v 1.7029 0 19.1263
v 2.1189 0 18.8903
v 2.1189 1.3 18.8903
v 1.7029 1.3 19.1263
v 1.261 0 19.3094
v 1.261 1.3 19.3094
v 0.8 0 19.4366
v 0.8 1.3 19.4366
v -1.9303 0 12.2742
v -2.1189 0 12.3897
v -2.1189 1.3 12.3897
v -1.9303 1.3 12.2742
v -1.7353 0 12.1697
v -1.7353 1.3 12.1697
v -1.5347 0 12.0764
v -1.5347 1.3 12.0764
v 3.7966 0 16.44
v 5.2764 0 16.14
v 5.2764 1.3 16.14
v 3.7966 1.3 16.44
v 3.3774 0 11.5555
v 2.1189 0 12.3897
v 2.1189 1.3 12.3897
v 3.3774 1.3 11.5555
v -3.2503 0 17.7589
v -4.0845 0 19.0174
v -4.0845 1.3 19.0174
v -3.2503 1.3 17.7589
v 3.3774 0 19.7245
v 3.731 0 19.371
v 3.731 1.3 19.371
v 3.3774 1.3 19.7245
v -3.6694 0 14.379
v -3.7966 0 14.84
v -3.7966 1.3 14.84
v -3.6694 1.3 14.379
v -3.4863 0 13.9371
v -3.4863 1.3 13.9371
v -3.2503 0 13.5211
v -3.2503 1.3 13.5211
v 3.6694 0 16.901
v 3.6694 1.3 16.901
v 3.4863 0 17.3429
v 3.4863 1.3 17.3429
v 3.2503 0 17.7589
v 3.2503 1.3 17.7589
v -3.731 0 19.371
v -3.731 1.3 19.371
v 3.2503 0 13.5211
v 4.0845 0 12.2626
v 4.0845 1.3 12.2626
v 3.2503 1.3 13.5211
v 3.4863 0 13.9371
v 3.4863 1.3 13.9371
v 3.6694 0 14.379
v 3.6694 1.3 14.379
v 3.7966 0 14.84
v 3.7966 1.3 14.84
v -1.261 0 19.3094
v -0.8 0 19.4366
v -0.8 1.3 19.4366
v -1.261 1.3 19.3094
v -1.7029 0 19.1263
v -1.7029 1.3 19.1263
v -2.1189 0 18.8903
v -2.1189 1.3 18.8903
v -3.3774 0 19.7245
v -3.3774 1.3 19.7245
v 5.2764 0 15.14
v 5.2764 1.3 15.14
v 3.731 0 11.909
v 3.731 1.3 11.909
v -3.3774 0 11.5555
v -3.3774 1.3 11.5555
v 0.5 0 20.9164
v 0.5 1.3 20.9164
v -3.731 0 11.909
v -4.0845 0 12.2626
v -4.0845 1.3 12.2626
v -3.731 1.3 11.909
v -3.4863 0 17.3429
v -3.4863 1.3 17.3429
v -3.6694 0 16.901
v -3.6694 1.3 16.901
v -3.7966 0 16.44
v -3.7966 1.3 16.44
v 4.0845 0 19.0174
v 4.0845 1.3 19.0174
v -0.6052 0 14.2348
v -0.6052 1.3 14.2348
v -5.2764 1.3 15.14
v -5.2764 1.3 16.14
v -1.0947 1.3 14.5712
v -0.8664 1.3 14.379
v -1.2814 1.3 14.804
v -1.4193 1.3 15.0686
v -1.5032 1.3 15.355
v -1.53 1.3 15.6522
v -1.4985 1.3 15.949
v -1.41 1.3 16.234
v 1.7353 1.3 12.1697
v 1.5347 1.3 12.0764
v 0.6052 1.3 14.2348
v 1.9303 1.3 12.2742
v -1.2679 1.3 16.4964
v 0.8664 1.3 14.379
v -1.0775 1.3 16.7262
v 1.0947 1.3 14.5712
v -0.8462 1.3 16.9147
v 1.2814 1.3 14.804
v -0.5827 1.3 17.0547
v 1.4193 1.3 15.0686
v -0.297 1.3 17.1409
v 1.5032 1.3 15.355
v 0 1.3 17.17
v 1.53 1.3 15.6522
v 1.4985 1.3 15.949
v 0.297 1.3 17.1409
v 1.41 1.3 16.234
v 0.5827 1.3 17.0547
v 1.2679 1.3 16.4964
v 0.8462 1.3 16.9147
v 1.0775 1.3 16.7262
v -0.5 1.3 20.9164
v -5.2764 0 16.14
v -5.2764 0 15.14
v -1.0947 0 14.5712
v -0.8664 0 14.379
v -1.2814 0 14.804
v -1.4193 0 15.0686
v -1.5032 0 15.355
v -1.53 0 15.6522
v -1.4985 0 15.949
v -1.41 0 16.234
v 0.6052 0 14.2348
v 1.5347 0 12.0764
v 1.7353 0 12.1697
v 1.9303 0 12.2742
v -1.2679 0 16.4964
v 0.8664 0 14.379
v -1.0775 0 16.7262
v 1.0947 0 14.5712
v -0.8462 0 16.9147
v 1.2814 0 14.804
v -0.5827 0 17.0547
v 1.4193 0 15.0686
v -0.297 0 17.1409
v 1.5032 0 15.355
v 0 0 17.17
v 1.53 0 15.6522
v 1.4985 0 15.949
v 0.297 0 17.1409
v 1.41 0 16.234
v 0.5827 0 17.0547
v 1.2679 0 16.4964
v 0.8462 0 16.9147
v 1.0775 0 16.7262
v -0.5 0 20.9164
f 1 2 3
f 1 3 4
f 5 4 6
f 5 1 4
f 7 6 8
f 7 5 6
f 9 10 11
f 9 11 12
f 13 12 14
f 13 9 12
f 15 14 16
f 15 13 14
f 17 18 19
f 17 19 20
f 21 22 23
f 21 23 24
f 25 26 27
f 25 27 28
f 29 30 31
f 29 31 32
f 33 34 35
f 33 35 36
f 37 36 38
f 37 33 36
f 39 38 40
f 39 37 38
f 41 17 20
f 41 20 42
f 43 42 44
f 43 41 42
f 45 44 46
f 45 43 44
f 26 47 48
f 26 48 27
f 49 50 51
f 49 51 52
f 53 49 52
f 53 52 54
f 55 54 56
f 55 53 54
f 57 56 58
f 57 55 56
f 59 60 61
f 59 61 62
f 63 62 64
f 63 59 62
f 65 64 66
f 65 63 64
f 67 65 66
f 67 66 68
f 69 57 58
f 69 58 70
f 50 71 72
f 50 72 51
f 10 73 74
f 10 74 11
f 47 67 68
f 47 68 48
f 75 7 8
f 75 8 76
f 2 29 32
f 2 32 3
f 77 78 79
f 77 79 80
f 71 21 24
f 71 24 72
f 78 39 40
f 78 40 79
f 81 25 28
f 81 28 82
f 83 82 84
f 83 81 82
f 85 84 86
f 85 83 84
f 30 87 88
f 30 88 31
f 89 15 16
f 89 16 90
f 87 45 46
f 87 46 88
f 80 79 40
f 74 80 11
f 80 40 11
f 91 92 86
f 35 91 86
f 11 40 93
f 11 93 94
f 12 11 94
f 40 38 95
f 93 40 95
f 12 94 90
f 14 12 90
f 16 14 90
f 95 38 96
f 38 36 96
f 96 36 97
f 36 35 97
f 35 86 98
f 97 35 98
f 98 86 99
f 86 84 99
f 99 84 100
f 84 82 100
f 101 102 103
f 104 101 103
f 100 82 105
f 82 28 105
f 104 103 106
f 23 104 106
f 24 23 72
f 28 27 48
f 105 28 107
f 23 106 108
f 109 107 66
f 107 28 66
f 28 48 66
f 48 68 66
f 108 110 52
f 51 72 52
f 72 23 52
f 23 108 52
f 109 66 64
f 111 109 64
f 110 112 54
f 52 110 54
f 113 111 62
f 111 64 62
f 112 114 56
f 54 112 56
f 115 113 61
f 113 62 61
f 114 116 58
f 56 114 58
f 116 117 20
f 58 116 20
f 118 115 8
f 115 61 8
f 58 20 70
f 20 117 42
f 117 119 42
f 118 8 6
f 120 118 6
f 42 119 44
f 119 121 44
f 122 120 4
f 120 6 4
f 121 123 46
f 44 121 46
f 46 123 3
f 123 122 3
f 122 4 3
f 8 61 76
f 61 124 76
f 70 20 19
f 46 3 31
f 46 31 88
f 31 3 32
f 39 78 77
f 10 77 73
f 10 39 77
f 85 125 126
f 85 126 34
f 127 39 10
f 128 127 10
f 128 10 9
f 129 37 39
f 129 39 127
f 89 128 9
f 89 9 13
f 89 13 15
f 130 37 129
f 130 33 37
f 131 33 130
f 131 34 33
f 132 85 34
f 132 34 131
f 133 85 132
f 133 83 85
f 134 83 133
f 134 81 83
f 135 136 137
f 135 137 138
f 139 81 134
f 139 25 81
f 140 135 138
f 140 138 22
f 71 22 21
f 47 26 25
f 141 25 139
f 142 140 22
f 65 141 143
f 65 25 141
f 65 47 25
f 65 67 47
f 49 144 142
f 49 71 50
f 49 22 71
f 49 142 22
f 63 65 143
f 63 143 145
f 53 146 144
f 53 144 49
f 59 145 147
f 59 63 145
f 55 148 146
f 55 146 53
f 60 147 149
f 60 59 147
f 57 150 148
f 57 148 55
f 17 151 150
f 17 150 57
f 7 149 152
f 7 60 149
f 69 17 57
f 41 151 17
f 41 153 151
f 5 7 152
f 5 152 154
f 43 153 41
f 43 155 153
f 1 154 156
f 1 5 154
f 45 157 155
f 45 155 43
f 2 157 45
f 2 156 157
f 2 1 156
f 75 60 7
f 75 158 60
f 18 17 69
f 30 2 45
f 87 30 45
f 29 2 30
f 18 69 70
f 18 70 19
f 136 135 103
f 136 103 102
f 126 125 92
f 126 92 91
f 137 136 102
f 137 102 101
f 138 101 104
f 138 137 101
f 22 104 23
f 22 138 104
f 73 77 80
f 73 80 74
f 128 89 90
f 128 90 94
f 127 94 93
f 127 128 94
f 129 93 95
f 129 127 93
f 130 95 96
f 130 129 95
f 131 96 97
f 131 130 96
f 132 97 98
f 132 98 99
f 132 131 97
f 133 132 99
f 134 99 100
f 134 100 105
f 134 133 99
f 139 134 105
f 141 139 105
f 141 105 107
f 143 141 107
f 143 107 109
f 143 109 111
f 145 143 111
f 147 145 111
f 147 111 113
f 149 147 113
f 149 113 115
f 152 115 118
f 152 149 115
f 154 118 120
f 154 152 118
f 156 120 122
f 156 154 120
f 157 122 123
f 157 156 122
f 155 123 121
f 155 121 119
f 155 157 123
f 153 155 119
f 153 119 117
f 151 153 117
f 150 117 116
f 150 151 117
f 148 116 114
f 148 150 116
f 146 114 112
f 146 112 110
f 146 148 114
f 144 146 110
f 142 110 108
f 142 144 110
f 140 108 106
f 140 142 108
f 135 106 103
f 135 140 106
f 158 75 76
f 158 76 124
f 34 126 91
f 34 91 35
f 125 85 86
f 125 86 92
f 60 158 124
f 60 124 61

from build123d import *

# Parameters (mm, degrees)
BOSS_EXTRUDE6_DEPTH = 1.3


with BuildPart() as part:
    # Sketch20 → Boss-Extrude6 (new body)
    with BuildSketch(Plane(origin=(0, 0, -30), x_dir=(-1, 0, 0), z_dir=(0, 1, 0))):
        with BuildLine():
            Line((1.53471655, 42.07642804), (0.605184619, 44.234777037))
            ThreePointArc((0.605184619, 44.234777037), (0, 47.17), (-0.605184619, 44.234777037))
            Line((-0.605184619, 44.234777037), (-1.53471655, 42.07642804))
            ThreePointArc((-1.53471655, 42.07642804), (-1.833529499, 42.220560049), (-2.118937454, 42.389691697))
            Line((-2.118937454, 42.389691697), (-3.377398231, 41.555494988))
            Line((-3.377398231, 41.555494988), (-3.730951621, 41.909048379))
            Line((-3.730951621, 41.909048379), (-4.084505012, 42.262601769))
            Line((-4.084505012, 42.262601769), (-3.250308303, 43.521062546))
            ThreePointArc((-3.250308303, 43.521062546), (-3.584652586, 44.155188282), (-3.796630085, 44.84))
            Line((-3.796630085, 44.84), (-5.276362383, 45.14))
            Line((-5.276362383, 45.14), (-5.276362383, 45.64))
            Line((-5.276362383, 45.64), (-5.276362383, 46.14))
            Line((-5.276362383, 46.14), (-3.796630085, 46.44))
            ThreePointArc((-3.796630085, 46.44), (-3.584652586, 47.124811718), (-3.250308303, 47.758937454))
            Line((-3.250308303, 47.758937454), (-4.084505012, 49.017398231))
            Line((-4.084505012, 49.017398231), (-3.730951621, 49.370951621))
            Line((-3.730951621, 49.370951621), (-3.377398231, 49.724505012))
            Line((-3.377398231, 49.724505012), (-2.118937454, 48.890308303))
            ThreePointArc((-2.118937454, 48.890308303), (-1.484811718, 49.224652586), (-0.8, 49.436630085))
            Line((-0.8, 49.436630085), (-0.5, 50.916362383))
            Line((-0.5, 50.916362383), (0, 50.916362383))
            Line((0, 50.916362383), (0.5, 50.916362383))
            Line((0.5, 50.916362383), (0.8, 49.436630085))
            ThreePointArc((0.8, 49.436630085), (1.484811718, 49.224652586), (2.118937454, 48.890308303))
            Line((2.118937454, 48.890308303), (3.377398231, 49.724505012))
            Line((3.377398231, 49.724505012), (3.730951621, 49.370951621))
            Line((3.730951621, 49.370951621), (4.084505012, 49.017398231))
            Line((4.084505012, 49.017398231), (3.250308303, 47.758937454))
            ThreePointArc((3.250308303, 47.758937454), (3.584652586, 47.124811718), (3.796630085, 46.44))
            Line((3.796630085, 46.44), (5.276362383, 46.14))
            Line((5.276362383, 46.14), (5.276362383, 45.64))
            Line((5.276362383, 45.64), (5.276362383, 45.14))
            Line((5.276362383, 45.14), (3.796630085, 44.84))
            ThreePointArc((3.796630085, 44.84), (3.584652586, 44.155188282), (3.250308303, 43.521062546))
            Line((3.250308303, 43.521062546), (4.084505012, 42.262601769))
            Line((4.084505012, 42.262601769), (3.730951621, 41.909048379))
            Line((3.730951621, 41.909048379), (3.377398231, 41.555494988))
            Line((3.377398231, 41.555494988), (2.118937454, 42.389691697))
            ThreePointArc((2.118937454, 42.389691697), (1.833529499, 42.220560049), (1.53471655, 42.07642804))
        make_face()
    extrude(amount=BOSS_EXTRUDE6_DEPTH)


solid = part.part
